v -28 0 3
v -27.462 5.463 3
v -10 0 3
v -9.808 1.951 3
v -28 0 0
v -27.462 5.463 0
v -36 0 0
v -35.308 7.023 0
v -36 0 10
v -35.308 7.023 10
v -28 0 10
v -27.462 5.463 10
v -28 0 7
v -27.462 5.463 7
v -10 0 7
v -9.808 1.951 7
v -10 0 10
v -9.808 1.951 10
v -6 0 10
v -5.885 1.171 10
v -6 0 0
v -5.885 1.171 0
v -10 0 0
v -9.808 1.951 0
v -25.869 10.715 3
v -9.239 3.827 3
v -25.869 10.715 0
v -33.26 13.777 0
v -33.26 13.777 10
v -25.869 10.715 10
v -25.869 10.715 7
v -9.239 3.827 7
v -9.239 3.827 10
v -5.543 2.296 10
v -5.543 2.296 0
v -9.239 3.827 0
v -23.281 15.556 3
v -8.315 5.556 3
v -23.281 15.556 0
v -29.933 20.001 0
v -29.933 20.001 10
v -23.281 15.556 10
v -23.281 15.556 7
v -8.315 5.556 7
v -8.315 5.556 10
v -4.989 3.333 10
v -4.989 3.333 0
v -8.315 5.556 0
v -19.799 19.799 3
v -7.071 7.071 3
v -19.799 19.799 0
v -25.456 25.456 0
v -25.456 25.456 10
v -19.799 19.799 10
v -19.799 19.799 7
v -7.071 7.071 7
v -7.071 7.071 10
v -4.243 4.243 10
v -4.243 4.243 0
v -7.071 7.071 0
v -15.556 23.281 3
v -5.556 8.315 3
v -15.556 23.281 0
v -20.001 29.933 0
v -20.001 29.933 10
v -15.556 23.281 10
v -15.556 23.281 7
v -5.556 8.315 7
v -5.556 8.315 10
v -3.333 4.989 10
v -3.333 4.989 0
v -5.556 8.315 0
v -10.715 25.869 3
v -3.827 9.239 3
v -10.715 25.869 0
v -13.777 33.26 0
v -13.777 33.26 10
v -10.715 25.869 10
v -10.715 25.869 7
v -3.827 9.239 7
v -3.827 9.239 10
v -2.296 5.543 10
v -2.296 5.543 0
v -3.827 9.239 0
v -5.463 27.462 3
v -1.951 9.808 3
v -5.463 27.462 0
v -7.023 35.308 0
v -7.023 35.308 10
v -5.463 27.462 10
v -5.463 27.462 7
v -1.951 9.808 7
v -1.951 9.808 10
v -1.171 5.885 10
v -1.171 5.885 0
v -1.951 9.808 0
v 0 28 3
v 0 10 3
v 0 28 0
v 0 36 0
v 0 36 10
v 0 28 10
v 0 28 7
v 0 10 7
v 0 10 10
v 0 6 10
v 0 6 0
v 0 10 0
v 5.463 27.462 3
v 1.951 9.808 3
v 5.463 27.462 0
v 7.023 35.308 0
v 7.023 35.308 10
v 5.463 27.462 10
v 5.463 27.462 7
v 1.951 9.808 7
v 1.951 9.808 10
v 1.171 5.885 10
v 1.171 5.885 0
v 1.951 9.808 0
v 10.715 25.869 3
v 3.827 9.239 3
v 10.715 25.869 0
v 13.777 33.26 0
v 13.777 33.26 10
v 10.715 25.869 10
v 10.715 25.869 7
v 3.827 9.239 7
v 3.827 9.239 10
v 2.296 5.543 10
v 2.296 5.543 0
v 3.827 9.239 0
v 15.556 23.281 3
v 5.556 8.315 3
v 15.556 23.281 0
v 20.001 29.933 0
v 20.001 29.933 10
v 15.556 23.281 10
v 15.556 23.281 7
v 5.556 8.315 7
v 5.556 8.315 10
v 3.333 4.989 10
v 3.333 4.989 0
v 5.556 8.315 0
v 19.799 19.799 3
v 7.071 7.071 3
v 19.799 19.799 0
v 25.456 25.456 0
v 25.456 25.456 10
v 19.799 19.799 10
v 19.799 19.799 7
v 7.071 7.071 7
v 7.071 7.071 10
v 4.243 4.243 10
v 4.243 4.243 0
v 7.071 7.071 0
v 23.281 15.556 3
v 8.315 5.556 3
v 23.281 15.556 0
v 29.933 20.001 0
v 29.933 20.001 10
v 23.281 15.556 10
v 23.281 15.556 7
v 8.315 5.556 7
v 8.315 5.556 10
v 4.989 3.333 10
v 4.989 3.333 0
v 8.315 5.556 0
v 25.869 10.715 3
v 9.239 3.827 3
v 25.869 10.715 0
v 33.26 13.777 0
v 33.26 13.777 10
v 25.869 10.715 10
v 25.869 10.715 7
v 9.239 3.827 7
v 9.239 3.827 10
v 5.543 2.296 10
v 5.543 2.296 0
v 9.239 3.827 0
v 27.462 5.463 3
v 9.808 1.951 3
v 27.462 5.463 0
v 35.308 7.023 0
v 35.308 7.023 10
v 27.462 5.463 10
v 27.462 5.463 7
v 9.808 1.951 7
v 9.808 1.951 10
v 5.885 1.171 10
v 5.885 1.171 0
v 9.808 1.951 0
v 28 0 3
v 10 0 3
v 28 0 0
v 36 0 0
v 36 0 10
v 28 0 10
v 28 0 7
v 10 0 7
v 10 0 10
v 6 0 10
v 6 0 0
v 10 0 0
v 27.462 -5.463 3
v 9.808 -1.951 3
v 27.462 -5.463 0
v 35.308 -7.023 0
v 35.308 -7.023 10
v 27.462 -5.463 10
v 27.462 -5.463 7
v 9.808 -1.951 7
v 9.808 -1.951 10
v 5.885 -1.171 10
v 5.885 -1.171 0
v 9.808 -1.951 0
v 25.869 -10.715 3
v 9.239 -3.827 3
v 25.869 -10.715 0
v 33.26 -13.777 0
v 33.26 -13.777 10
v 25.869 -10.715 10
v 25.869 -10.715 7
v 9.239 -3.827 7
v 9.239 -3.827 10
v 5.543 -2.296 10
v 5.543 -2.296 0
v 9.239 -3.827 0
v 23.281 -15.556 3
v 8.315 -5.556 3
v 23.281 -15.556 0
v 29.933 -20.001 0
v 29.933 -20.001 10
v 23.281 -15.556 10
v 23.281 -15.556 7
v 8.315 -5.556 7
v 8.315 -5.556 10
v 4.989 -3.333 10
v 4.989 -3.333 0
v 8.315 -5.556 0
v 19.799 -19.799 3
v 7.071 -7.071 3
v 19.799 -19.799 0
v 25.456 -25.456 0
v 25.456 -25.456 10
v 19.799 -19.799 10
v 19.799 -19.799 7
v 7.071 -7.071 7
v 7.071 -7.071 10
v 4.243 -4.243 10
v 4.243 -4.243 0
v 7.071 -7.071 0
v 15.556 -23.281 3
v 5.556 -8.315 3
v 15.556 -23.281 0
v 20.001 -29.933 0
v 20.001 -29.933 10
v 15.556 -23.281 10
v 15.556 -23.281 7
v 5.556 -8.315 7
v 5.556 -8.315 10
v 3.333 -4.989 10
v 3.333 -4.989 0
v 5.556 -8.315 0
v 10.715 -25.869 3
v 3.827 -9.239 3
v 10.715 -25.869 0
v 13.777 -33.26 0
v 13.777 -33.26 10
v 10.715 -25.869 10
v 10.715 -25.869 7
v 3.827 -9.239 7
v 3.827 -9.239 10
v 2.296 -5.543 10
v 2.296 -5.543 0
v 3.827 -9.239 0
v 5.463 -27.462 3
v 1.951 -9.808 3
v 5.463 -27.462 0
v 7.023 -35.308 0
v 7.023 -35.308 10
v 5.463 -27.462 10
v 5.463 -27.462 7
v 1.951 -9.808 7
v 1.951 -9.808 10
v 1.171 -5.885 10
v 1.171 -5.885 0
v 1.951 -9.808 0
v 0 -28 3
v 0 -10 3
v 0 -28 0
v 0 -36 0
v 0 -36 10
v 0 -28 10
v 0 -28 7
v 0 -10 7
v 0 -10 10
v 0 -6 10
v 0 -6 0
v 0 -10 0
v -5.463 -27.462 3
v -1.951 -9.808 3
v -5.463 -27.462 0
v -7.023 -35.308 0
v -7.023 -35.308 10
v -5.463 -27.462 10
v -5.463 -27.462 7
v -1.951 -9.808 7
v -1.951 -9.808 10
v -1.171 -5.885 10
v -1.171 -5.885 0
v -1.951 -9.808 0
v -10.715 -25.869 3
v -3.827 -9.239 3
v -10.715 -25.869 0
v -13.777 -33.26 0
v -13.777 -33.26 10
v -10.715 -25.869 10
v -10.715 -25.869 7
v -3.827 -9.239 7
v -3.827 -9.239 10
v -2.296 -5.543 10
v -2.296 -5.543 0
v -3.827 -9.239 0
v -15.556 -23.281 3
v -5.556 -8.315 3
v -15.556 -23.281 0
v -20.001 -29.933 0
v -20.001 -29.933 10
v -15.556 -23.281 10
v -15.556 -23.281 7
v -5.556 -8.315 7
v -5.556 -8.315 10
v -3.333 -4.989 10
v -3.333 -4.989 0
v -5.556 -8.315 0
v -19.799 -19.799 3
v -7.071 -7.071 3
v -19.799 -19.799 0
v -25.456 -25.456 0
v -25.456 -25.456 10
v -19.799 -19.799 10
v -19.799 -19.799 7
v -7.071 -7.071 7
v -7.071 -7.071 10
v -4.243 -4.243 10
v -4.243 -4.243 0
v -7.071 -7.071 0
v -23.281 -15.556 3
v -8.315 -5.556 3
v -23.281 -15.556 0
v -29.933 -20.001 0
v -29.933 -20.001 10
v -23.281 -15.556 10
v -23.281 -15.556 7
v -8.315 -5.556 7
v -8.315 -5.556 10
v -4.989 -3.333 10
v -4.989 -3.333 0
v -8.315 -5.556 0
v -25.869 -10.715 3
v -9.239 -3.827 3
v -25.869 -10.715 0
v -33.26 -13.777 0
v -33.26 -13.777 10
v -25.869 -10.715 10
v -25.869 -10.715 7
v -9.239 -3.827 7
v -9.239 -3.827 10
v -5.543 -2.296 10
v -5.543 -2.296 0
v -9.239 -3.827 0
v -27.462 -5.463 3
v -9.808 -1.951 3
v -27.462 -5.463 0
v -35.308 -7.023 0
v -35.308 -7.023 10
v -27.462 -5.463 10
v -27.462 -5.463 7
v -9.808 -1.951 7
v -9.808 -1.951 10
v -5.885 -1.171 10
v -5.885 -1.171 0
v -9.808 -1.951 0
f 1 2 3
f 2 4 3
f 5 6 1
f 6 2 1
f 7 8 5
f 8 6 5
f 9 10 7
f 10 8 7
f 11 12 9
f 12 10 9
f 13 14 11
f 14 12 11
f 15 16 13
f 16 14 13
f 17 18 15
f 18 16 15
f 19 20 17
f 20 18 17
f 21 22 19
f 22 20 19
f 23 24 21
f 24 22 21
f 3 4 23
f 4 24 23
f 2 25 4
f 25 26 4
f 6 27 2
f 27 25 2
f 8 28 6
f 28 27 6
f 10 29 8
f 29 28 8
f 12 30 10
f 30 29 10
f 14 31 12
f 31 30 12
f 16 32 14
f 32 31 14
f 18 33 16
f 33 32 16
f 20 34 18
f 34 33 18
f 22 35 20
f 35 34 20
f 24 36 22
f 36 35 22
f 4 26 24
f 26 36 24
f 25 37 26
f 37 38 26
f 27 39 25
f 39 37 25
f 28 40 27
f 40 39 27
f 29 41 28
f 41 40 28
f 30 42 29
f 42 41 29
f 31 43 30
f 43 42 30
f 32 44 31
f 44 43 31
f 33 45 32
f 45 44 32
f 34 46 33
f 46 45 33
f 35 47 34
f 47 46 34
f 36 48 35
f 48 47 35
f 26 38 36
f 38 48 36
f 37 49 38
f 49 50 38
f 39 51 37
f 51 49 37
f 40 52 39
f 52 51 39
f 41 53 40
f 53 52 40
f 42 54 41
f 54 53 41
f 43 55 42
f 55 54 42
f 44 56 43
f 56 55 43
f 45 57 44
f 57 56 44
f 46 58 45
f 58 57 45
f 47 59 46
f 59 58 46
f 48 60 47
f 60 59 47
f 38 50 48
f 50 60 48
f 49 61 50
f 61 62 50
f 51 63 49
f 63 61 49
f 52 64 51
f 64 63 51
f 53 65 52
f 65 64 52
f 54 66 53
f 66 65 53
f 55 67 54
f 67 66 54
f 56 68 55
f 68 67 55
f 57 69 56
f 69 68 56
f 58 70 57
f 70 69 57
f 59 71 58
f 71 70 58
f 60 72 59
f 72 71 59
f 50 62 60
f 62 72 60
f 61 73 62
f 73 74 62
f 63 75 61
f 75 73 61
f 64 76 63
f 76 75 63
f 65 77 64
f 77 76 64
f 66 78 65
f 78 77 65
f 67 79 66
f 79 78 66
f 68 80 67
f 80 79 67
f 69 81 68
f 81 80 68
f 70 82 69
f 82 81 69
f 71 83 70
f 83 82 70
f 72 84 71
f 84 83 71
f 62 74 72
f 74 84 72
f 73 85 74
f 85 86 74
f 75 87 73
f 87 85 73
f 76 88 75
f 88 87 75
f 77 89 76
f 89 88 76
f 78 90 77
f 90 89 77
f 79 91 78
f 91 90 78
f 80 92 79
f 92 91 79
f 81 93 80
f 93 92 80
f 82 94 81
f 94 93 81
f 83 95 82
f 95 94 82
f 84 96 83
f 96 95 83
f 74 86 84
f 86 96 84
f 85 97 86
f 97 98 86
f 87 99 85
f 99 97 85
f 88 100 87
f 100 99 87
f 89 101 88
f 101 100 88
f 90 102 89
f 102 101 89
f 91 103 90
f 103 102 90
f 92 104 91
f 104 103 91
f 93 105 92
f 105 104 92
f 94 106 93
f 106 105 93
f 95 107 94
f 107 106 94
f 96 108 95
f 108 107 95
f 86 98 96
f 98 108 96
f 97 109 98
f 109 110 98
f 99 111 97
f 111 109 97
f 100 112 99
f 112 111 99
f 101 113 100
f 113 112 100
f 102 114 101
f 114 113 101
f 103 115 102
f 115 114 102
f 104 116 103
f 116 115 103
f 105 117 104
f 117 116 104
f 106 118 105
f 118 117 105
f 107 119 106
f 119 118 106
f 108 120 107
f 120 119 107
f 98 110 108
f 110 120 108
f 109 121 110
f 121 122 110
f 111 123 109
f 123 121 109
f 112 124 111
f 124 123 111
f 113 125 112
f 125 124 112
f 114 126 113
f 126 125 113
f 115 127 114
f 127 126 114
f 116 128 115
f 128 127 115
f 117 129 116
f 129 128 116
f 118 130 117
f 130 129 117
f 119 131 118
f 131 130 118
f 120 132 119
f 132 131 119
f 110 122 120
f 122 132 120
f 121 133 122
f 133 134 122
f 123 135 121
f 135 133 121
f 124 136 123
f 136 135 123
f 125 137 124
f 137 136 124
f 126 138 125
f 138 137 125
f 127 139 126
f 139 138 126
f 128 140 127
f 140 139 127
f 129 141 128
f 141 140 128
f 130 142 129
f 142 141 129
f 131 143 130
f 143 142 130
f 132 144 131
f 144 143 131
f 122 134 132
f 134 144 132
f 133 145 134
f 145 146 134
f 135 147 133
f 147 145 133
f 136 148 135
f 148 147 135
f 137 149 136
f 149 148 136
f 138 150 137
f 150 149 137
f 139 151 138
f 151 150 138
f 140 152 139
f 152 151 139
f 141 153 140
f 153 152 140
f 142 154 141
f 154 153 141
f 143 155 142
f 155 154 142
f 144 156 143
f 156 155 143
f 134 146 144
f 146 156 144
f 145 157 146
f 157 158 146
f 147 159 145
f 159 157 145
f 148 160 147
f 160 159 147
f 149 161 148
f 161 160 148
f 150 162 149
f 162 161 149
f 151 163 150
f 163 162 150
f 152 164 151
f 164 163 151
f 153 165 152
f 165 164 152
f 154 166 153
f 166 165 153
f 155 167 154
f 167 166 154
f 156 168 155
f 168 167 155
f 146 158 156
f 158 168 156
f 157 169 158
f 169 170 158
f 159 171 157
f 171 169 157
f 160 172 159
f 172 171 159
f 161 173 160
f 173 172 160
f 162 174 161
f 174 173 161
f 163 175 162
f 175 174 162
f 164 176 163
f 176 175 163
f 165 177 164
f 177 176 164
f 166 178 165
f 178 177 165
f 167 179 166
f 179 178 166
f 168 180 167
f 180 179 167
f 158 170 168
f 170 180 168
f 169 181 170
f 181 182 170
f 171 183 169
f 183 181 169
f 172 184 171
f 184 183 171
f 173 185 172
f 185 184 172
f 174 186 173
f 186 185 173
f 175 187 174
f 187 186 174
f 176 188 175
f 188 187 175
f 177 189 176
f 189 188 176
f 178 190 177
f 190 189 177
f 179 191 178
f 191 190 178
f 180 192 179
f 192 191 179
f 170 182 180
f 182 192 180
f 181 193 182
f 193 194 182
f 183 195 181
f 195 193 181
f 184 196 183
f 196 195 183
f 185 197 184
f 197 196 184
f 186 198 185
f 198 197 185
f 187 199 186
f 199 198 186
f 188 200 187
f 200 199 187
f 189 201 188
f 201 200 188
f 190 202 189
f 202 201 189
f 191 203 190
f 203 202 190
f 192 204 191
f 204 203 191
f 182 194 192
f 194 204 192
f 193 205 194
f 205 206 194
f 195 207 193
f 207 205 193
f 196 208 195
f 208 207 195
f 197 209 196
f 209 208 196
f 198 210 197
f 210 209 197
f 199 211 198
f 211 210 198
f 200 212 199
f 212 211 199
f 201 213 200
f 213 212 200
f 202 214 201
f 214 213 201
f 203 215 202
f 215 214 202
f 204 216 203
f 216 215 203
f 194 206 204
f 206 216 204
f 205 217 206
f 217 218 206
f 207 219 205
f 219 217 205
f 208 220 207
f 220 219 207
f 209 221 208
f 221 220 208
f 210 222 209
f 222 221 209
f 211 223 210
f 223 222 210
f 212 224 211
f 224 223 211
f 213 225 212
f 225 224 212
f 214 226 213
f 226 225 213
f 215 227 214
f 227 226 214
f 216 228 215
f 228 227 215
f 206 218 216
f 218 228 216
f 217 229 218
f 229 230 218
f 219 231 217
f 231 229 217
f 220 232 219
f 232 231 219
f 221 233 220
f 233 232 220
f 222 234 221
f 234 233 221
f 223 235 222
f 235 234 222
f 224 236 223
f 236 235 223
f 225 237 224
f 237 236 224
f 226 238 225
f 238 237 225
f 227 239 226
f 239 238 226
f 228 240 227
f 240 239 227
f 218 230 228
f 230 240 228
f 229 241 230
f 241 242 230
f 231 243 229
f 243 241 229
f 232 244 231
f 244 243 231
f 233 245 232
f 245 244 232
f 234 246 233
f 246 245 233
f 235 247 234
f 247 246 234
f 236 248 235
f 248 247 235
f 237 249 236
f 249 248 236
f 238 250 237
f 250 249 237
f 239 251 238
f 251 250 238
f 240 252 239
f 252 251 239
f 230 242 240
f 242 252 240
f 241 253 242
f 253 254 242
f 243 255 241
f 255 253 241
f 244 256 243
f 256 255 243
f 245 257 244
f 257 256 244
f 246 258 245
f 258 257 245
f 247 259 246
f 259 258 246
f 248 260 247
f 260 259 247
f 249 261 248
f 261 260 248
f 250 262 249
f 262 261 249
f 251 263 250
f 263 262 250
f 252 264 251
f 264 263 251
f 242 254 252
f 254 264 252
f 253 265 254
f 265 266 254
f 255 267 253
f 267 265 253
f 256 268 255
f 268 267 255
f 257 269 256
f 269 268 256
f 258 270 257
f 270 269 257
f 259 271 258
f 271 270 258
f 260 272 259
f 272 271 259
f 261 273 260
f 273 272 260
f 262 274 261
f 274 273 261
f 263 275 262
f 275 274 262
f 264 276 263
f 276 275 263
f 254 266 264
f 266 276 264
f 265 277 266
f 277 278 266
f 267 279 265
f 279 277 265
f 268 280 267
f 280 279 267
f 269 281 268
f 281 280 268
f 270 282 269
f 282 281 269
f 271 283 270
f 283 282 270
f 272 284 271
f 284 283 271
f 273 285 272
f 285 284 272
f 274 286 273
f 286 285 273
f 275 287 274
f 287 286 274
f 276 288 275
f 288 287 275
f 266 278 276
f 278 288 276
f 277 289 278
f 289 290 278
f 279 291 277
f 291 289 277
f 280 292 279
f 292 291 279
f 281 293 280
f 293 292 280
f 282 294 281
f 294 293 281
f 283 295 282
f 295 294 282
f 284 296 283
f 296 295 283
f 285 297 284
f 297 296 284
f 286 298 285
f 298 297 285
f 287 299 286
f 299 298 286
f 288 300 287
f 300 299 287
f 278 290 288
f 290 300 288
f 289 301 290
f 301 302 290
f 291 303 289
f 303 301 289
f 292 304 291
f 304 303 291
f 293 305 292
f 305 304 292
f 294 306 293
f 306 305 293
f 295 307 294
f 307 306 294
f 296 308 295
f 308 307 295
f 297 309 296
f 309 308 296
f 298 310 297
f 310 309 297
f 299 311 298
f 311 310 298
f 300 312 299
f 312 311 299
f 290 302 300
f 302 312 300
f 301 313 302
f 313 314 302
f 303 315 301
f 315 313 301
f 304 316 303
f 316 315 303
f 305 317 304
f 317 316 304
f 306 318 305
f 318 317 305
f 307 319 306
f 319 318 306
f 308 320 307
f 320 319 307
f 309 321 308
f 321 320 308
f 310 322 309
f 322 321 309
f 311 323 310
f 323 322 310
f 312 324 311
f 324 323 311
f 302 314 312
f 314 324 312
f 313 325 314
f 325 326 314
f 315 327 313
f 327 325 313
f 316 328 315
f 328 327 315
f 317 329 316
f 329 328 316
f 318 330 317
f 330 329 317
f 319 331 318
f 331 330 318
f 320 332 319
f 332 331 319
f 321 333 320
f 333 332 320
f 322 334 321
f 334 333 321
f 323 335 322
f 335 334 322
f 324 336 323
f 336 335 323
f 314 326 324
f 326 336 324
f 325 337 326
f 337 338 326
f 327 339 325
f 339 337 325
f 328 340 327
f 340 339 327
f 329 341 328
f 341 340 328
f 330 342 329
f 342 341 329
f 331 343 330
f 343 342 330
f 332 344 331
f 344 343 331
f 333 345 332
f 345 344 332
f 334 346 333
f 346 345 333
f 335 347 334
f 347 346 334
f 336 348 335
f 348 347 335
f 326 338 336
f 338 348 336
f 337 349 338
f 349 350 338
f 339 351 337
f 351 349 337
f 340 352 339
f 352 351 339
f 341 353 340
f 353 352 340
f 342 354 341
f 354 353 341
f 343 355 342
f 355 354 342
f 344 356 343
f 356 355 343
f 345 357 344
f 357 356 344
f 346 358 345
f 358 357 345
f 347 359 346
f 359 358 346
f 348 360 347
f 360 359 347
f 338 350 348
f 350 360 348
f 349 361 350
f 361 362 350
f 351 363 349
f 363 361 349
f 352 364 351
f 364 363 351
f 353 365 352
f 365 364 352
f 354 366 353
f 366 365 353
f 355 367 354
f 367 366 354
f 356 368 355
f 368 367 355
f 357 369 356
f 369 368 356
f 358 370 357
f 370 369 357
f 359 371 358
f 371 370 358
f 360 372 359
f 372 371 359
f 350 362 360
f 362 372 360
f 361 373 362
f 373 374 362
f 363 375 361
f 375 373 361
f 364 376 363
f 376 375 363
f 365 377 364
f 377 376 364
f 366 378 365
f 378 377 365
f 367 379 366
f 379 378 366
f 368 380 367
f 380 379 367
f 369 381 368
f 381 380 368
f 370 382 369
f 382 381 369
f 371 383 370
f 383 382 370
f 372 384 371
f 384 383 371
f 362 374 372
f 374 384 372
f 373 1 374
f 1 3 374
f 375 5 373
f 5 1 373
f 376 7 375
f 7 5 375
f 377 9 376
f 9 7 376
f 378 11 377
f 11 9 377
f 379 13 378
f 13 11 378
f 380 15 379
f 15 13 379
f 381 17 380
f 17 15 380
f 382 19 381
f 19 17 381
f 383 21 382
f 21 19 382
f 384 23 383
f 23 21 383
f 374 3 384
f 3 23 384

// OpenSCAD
$fn = 32;

// ----------------------------------------------------------------------
// Revolved part: handwheel R36
// ----------------------------------------------------------------------

// --- parameters (mm) ---
bore_r = 6;               // bore radius
rim_r = 36;               // rim radius
rim_w = 8;                // rim axial width
rim_t = 10;               // rim diameter height
hub_r = 10;               // hub radius
web_t = 4;                // web thickness
revolve_angle = 360;      // revolve sweep, degrees

bore_d = 2 * bore_r;
rim_d = 2 * rim_r;
hub_d = 2 * hub_r;

profile = [[6, 0], [10, 0], [10, 3], [28, 3], [28, 0], [36, 0], [36, 10], [28, 10], [28, 7], [10, 7], [10, 10], [6, 10]];  // primary outline, 12 points, counter clockwise

// --- the one profile operation ---
rotate_extrude(angle = revolve_angle) polygon(points = profile);
